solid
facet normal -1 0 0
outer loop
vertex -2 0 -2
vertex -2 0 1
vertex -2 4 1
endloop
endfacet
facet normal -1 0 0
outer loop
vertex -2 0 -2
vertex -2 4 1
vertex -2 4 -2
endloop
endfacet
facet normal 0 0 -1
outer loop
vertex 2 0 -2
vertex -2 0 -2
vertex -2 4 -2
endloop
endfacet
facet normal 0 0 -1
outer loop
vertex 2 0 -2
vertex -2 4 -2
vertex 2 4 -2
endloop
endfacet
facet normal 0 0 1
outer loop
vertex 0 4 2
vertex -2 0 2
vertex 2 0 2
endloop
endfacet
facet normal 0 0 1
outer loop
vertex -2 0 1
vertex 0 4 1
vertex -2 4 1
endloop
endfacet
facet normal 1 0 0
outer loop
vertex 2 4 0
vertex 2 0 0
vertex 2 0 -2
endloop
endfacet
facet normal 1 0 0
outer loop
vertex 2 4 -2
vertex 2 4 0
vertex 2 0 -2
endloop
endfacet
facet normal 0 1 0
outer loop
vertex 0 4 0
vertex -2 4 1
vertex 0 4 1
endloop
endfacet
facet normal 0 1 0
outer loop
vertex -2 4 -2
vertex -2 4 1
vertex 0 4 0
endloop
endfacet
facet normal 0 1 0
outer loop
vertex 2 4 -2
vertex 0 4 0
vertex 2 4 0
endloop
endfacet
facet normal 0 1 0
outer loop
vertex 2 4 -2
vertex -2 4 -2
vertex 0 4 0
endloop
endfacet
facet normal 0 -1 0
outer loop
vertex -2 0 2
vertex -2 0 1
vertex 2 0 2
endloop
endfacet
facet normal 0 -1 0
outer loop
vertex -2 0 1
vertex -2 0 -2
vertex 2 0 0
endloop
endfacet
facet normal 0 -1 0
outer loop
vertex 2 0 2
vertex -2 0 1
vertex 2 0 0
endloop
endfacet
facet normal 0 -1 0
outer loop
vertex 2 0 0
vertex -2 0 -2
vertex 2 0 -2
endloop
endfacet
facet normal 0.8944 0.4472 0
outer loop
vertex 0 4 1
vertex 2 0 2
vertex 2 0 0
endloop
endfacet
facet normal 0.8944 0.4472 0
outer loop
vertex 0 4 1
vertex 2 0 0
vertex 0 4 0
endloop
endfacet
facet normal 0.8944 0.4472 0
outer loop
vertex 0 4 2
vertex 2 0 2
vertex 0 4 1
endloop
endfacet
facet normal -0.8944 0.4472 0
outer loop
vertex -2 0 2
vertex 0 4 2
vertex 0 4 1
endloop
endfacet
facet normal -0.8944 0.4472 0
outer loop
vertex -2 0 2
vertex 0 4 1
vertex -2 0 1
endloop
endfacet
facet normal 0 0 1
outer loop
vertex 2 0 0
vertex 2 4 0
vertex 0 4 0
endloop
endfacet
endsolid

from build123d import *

# Parameters (mm, degrees)
SKETCH1_W           = 4
SKETCH1_H           = 4
BOSS_EXTRUDE1_DEPTH = 4
CUT_EXTRUDE1_DEPTH  = 2
CUT_EXTRUDE2_DEPTH  = 1


with BuildPart() as part:
    # Sketch1 → Boss-Extrude1 (new body)
    with BuildSketch(Plane(origin=(0, 0, 0), x_dir=(1, 0, 0), z_dir=(0, 1, 0))):
        Rectangle(SKETCH1_W, SKETCH1_H)
    extrude(amount=BOSS_EXTRUDE1_DEPTH)

    # Sketch4 → Cut-Extrude1 (cut)
    with BuildSketch(Plane.XY.offset(2)):
        Polygon((0, 4), (2, 4), (2, 0), align=None)
    extrude(amount=-CUT_EXTRUDE1_DEPTH, mode=Mode.SUBTRACT)

    # Sketch5 → Cut-Extrude2 (cut)
    with BuildSketch(Plane.XY.offset(2)):
        Polygon((0, 4), (-2, 0), (-2, 4), align=None)
    extrude(amount=-CUT_EXTRUDE2_DEPTH, mode=Mode.SUBTRACT)


solid = part.part
